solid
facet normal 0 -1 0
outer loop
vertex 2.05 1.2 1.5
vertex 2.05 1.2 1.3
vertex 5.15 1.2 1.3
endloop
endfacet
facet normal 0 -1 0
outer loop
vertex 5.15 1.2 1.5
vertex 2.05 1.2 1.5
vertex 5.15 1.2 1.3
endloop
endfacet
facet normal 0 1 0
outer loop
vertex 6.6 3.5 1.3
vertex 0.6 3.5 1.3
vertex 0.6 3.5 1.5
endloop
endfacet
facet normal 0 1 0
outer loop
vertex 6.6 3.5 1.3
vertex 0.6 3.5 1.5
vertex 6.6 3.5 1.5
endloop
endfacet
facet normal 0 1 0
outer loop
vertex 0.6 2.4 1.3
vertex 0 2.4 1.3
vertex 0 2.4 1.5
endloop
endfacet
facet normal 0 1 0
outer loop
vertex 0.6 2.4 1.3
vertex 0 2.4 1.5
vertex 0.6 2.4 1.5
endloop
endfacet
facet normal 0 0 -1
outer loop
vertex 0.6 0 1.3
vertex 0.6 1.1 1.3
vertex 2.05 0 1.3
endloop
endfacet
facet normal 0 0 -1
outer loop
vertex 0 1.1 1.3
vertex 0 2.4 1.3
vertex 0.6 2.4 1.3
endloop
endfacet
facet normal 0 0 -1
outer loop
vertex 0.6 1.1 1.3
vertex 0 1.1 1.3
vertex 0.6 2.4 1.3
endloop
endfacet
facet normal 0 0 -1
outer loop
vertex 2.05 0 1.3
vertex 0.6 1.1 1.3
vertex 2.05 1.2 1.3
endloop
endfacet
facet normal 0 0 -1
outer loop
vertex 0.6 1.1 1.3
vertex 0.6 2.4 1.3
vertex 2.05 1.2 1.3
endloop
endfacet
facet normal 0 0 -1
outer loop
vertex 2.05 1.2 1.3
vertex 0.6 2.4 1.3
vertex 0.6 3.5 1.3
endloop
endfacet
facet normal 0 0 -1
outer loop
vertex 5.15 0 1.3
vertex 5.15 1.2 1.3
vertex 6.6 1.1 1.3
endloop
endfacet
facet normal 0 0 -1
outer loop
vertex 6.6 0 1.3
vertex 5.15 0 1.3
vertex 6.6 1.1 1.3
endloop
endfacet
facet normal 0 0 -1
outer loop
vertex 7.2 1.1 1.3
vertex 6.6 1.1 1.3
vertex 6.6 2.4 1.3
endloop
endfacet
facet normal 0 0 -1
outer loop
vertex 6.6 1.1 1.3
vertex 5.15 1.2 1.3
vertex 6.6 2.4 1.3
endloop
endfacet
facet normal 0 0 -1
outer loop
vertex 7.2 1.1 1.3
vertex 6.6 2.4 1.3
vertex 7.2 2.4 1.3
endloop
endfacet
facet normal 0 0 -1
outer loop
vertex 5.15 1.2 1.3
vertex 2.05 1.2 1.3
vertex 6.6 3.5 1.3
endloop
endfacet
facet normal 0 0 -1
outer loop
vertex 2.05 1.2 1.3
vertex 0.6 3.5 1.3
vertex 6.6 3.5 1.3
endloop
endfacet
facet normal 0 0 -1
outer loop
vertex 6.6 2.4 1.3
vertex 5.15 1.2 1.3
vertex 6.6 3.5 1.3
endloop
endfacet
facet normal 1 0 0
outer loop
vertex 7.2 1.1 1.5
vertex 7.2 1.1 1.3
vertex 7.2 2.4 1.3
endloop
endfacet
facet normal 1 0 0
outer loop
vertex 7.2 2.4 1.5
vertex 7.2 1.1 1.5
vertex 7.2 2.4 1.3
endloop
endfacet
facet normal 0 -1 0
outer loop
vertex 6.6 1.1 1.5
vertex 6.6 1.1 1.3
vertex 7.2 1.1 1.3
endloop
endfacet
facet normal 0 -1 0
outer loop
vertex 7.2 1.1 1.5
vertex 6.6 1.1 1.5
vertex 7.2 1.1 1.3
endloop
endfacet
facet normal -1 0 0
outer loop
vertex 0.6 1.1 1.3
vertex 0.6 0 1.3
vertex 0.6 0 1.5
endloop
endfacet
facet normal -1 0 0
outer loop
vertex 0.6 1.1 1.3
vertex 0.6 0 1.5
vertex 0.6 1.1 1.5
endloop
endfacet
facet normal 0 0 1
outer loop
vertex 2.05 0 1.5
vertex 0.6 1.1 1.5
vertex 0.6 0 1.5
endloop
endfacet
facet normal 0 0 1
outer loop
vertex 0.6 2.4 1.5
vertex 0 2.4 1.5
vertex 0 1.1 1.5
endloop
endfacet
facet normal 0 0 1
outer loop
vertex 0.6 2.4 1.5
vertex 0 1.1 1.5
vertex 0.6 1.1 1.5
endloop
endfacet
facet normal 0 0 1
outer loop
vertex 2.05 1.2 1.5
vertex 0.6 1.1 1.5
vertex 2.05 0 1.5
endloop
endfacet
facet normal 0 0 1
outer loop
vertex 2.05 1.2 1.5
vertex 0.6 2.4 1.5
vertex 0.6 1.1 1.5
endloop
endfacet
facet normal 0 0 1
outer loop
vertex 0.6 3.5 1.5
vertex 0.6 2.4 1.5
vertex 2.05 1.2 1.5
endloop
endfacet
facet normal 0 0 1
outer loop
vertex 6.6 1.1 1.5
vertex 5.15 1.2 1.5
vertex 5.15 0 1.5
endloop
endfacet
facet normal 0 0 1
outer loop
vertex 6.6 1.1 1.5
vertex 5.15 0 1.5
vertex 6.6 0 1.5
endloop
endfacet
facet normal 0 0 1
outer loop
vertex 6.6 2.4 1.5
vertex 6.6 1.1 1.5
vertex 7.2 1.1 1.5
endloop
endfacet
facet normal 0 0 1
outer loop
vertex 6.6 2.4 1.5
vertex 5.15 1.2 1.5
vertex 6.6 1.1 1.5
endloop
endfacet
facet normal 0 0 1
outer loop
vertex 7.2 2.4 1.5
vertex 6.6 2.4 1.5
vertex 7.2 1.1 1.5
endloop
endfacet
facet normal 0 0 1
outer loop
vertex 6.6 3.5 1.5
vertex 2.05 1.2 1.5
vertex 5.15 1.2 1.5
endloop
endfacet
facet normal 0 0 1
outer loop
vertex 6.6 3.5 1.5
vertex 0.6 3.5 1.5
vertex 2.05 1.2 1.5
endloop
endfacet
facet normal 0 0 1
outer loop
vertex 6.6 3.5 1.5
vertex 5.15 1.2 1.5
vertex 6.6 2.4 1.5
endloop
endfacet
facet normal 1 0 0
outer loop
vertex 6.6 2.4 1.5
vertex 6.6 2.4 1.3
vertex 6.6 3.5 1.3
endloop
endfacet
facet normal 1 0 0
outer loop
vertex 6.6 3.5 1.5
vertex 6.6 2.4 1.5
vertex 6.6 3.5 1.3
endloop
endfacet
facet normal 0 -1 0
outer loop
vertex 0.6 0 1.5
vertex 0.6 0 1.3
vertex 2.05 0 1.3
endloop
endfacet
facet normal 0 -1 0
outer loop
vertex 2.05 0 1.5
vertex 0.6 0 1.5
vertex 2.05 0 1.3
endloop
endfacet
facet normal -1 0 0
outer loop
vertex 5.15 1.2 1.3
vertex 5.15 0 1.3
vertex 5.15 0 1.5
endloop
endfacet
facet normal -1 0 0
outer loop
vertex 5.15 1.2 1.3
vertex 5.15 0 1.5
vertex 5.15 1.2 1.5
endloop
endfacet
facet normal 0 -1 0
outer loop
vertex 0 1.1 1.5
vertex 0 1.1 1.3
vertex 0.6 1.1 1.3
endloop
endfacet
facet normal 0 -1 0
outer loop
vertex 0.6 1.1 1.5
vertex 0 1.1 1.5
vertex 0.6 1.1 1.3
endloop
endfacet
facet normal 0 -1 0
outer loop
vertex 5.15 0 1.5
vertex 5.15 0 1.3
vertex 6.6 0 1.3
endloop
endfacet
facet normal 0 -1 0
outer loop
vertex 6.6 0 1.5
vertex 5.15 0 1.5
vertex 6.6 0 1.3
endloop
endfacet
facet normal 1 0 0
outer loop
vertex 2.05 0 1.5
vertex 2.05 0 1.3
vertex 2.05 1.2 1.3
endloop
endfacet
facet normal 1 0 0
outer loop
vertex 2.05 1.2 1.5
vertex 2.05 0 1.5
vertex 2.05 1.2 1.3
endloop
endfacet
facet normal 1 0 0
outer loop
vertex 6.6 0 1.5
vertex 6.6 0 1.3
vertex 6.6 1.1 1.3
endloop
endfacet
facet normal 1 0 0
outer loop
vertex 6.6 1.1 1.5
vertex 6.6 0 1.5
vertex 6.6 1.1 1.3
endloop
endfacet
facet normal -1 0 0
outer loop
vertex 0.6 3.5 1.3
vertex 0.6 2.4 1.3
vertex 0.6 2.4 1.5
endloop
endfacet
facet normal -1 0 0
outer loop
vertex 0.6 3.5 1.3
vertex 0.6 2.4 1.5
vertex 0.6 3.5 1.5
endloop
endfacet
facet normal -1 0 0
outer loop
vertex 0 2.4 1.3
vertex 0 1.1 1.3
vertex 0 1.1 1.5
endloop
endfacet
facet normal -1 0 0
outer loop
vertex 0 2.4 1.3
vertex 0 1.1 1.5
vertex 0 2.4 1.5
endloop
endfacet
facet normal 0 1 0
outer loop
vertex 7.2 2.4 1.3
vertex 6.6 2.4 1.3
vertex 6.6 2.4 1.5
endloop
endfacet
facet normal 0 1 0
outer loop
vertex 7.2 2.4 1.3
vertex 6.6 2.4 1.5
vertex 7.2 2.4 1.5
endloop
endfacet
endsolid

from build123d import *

# Parameters (mm, degrees)
BOX018_W     = 3.1
BOX018_H     = 1.2
BOX018_DEPTH = 0.2
BOX017_W     = 0.6
BOX017_H     = 1.1
BOX017_DEPTH = 0.2
BOX016_W     = 0.6
BOX016_H     = 1.1
BOX016_DEPTH = 0.2
BOX015_W     = 0.6
BOX015_H     = 1.1
BOX015_DEPTH = 0.2
BOX014_W     = 0.6
BOX014_H     = 1.1
BOX014_DEPTH = 0.2
BOX019_W     = 7.2
BOX019_H     = 3.5
BOX019_DEPTH = 0.2


with BuildPart() as cube018:
    # Box018 → Box018 (new body)
    with BuildSketch(Plane(origin=(2.05, 0, 1.3), x_dir=(1, 0, 0), z_dir=(0, 0, 1))):
        with Locations((1.55, 0.6)):
            Rectangle(BOX018_W, BOX018_H)
    extrude(amount=BOX018_DEPTH)


with BuildPart() as cube017:
    # Box017 → Box017 (new body)
    with BuildSketch(Plane(origin=(0, 2.4, 1.3), x_dir=(1, 0, 0), z_dir=(0, 0, 1))):
        with Locations((0.3, 0.55)):
            Rectangle(BOX017_W, BOX017_H)
    extrude(amount=BOX017_DEPTH)


with BuildPart() as cube016:
    # Box016 → Box016 (new body)
    with BuildSketch(Plane.XY.offset(1.3)):
        with Locations((0.3, 0.55)):
            Rectangle(BOX016_W, BOX016_H)
    extrude(amount=BOX016_DEPTH)


with BuildPart() as cube015:
    # Box015 → Box015 (new body)
    with BuildSketch(Plane(origin=(6.6, 2.4, 1.3), x_dir=(1, 0, 0), z_dir=(0, 0, 1))):
        with Locations((0.3, 0.55)):
            Rectangle(BOX015_W, BOX015_H)
    extrude(amount=BOX015_DEPTH)


with BuildPart() as cube014:
    # Box014 → Box014 (new body)
    with BuildSketch(Plane(origin=(6.6, 0, 1.3), x_dir=(1, 0, 0), z_dir=(0, 0, 1))):
        with Locations((0.3, 0.55)):
            Rectangle(BOX014_W, BOX014_H)
    extrude(amount=BOX014_DEPTH)


with BuildPart() as silver_top:
    # Box019 → Box019 (new body)
    with BuildSketch(Plane.XY.offset(1.3)):
        with Locations((3.6, 1.75)):
            Rectangle(BOX019_W, BOX019_H)
    extrude(amount=BOX019_DEPTH)

    # Cut: cut Cube014
    add(cube014.part, mode=Mode.SUBTRACT)

    # Cut001: cut Cube015
    add(cube015.part, mode=Mode.SUBTRACT)

    # Cut002: cut Cube016
    add(cube016.part, mode=Mode.SUBTRACT)

    # Cut003: cut Cube017
    add(cube017.part, mode=Mode.SUBTRACT)

    # Cut004: cut Cube018
    add(cube018.part, mode=Mode.SUBTRACT)


solid = silver_top.part
